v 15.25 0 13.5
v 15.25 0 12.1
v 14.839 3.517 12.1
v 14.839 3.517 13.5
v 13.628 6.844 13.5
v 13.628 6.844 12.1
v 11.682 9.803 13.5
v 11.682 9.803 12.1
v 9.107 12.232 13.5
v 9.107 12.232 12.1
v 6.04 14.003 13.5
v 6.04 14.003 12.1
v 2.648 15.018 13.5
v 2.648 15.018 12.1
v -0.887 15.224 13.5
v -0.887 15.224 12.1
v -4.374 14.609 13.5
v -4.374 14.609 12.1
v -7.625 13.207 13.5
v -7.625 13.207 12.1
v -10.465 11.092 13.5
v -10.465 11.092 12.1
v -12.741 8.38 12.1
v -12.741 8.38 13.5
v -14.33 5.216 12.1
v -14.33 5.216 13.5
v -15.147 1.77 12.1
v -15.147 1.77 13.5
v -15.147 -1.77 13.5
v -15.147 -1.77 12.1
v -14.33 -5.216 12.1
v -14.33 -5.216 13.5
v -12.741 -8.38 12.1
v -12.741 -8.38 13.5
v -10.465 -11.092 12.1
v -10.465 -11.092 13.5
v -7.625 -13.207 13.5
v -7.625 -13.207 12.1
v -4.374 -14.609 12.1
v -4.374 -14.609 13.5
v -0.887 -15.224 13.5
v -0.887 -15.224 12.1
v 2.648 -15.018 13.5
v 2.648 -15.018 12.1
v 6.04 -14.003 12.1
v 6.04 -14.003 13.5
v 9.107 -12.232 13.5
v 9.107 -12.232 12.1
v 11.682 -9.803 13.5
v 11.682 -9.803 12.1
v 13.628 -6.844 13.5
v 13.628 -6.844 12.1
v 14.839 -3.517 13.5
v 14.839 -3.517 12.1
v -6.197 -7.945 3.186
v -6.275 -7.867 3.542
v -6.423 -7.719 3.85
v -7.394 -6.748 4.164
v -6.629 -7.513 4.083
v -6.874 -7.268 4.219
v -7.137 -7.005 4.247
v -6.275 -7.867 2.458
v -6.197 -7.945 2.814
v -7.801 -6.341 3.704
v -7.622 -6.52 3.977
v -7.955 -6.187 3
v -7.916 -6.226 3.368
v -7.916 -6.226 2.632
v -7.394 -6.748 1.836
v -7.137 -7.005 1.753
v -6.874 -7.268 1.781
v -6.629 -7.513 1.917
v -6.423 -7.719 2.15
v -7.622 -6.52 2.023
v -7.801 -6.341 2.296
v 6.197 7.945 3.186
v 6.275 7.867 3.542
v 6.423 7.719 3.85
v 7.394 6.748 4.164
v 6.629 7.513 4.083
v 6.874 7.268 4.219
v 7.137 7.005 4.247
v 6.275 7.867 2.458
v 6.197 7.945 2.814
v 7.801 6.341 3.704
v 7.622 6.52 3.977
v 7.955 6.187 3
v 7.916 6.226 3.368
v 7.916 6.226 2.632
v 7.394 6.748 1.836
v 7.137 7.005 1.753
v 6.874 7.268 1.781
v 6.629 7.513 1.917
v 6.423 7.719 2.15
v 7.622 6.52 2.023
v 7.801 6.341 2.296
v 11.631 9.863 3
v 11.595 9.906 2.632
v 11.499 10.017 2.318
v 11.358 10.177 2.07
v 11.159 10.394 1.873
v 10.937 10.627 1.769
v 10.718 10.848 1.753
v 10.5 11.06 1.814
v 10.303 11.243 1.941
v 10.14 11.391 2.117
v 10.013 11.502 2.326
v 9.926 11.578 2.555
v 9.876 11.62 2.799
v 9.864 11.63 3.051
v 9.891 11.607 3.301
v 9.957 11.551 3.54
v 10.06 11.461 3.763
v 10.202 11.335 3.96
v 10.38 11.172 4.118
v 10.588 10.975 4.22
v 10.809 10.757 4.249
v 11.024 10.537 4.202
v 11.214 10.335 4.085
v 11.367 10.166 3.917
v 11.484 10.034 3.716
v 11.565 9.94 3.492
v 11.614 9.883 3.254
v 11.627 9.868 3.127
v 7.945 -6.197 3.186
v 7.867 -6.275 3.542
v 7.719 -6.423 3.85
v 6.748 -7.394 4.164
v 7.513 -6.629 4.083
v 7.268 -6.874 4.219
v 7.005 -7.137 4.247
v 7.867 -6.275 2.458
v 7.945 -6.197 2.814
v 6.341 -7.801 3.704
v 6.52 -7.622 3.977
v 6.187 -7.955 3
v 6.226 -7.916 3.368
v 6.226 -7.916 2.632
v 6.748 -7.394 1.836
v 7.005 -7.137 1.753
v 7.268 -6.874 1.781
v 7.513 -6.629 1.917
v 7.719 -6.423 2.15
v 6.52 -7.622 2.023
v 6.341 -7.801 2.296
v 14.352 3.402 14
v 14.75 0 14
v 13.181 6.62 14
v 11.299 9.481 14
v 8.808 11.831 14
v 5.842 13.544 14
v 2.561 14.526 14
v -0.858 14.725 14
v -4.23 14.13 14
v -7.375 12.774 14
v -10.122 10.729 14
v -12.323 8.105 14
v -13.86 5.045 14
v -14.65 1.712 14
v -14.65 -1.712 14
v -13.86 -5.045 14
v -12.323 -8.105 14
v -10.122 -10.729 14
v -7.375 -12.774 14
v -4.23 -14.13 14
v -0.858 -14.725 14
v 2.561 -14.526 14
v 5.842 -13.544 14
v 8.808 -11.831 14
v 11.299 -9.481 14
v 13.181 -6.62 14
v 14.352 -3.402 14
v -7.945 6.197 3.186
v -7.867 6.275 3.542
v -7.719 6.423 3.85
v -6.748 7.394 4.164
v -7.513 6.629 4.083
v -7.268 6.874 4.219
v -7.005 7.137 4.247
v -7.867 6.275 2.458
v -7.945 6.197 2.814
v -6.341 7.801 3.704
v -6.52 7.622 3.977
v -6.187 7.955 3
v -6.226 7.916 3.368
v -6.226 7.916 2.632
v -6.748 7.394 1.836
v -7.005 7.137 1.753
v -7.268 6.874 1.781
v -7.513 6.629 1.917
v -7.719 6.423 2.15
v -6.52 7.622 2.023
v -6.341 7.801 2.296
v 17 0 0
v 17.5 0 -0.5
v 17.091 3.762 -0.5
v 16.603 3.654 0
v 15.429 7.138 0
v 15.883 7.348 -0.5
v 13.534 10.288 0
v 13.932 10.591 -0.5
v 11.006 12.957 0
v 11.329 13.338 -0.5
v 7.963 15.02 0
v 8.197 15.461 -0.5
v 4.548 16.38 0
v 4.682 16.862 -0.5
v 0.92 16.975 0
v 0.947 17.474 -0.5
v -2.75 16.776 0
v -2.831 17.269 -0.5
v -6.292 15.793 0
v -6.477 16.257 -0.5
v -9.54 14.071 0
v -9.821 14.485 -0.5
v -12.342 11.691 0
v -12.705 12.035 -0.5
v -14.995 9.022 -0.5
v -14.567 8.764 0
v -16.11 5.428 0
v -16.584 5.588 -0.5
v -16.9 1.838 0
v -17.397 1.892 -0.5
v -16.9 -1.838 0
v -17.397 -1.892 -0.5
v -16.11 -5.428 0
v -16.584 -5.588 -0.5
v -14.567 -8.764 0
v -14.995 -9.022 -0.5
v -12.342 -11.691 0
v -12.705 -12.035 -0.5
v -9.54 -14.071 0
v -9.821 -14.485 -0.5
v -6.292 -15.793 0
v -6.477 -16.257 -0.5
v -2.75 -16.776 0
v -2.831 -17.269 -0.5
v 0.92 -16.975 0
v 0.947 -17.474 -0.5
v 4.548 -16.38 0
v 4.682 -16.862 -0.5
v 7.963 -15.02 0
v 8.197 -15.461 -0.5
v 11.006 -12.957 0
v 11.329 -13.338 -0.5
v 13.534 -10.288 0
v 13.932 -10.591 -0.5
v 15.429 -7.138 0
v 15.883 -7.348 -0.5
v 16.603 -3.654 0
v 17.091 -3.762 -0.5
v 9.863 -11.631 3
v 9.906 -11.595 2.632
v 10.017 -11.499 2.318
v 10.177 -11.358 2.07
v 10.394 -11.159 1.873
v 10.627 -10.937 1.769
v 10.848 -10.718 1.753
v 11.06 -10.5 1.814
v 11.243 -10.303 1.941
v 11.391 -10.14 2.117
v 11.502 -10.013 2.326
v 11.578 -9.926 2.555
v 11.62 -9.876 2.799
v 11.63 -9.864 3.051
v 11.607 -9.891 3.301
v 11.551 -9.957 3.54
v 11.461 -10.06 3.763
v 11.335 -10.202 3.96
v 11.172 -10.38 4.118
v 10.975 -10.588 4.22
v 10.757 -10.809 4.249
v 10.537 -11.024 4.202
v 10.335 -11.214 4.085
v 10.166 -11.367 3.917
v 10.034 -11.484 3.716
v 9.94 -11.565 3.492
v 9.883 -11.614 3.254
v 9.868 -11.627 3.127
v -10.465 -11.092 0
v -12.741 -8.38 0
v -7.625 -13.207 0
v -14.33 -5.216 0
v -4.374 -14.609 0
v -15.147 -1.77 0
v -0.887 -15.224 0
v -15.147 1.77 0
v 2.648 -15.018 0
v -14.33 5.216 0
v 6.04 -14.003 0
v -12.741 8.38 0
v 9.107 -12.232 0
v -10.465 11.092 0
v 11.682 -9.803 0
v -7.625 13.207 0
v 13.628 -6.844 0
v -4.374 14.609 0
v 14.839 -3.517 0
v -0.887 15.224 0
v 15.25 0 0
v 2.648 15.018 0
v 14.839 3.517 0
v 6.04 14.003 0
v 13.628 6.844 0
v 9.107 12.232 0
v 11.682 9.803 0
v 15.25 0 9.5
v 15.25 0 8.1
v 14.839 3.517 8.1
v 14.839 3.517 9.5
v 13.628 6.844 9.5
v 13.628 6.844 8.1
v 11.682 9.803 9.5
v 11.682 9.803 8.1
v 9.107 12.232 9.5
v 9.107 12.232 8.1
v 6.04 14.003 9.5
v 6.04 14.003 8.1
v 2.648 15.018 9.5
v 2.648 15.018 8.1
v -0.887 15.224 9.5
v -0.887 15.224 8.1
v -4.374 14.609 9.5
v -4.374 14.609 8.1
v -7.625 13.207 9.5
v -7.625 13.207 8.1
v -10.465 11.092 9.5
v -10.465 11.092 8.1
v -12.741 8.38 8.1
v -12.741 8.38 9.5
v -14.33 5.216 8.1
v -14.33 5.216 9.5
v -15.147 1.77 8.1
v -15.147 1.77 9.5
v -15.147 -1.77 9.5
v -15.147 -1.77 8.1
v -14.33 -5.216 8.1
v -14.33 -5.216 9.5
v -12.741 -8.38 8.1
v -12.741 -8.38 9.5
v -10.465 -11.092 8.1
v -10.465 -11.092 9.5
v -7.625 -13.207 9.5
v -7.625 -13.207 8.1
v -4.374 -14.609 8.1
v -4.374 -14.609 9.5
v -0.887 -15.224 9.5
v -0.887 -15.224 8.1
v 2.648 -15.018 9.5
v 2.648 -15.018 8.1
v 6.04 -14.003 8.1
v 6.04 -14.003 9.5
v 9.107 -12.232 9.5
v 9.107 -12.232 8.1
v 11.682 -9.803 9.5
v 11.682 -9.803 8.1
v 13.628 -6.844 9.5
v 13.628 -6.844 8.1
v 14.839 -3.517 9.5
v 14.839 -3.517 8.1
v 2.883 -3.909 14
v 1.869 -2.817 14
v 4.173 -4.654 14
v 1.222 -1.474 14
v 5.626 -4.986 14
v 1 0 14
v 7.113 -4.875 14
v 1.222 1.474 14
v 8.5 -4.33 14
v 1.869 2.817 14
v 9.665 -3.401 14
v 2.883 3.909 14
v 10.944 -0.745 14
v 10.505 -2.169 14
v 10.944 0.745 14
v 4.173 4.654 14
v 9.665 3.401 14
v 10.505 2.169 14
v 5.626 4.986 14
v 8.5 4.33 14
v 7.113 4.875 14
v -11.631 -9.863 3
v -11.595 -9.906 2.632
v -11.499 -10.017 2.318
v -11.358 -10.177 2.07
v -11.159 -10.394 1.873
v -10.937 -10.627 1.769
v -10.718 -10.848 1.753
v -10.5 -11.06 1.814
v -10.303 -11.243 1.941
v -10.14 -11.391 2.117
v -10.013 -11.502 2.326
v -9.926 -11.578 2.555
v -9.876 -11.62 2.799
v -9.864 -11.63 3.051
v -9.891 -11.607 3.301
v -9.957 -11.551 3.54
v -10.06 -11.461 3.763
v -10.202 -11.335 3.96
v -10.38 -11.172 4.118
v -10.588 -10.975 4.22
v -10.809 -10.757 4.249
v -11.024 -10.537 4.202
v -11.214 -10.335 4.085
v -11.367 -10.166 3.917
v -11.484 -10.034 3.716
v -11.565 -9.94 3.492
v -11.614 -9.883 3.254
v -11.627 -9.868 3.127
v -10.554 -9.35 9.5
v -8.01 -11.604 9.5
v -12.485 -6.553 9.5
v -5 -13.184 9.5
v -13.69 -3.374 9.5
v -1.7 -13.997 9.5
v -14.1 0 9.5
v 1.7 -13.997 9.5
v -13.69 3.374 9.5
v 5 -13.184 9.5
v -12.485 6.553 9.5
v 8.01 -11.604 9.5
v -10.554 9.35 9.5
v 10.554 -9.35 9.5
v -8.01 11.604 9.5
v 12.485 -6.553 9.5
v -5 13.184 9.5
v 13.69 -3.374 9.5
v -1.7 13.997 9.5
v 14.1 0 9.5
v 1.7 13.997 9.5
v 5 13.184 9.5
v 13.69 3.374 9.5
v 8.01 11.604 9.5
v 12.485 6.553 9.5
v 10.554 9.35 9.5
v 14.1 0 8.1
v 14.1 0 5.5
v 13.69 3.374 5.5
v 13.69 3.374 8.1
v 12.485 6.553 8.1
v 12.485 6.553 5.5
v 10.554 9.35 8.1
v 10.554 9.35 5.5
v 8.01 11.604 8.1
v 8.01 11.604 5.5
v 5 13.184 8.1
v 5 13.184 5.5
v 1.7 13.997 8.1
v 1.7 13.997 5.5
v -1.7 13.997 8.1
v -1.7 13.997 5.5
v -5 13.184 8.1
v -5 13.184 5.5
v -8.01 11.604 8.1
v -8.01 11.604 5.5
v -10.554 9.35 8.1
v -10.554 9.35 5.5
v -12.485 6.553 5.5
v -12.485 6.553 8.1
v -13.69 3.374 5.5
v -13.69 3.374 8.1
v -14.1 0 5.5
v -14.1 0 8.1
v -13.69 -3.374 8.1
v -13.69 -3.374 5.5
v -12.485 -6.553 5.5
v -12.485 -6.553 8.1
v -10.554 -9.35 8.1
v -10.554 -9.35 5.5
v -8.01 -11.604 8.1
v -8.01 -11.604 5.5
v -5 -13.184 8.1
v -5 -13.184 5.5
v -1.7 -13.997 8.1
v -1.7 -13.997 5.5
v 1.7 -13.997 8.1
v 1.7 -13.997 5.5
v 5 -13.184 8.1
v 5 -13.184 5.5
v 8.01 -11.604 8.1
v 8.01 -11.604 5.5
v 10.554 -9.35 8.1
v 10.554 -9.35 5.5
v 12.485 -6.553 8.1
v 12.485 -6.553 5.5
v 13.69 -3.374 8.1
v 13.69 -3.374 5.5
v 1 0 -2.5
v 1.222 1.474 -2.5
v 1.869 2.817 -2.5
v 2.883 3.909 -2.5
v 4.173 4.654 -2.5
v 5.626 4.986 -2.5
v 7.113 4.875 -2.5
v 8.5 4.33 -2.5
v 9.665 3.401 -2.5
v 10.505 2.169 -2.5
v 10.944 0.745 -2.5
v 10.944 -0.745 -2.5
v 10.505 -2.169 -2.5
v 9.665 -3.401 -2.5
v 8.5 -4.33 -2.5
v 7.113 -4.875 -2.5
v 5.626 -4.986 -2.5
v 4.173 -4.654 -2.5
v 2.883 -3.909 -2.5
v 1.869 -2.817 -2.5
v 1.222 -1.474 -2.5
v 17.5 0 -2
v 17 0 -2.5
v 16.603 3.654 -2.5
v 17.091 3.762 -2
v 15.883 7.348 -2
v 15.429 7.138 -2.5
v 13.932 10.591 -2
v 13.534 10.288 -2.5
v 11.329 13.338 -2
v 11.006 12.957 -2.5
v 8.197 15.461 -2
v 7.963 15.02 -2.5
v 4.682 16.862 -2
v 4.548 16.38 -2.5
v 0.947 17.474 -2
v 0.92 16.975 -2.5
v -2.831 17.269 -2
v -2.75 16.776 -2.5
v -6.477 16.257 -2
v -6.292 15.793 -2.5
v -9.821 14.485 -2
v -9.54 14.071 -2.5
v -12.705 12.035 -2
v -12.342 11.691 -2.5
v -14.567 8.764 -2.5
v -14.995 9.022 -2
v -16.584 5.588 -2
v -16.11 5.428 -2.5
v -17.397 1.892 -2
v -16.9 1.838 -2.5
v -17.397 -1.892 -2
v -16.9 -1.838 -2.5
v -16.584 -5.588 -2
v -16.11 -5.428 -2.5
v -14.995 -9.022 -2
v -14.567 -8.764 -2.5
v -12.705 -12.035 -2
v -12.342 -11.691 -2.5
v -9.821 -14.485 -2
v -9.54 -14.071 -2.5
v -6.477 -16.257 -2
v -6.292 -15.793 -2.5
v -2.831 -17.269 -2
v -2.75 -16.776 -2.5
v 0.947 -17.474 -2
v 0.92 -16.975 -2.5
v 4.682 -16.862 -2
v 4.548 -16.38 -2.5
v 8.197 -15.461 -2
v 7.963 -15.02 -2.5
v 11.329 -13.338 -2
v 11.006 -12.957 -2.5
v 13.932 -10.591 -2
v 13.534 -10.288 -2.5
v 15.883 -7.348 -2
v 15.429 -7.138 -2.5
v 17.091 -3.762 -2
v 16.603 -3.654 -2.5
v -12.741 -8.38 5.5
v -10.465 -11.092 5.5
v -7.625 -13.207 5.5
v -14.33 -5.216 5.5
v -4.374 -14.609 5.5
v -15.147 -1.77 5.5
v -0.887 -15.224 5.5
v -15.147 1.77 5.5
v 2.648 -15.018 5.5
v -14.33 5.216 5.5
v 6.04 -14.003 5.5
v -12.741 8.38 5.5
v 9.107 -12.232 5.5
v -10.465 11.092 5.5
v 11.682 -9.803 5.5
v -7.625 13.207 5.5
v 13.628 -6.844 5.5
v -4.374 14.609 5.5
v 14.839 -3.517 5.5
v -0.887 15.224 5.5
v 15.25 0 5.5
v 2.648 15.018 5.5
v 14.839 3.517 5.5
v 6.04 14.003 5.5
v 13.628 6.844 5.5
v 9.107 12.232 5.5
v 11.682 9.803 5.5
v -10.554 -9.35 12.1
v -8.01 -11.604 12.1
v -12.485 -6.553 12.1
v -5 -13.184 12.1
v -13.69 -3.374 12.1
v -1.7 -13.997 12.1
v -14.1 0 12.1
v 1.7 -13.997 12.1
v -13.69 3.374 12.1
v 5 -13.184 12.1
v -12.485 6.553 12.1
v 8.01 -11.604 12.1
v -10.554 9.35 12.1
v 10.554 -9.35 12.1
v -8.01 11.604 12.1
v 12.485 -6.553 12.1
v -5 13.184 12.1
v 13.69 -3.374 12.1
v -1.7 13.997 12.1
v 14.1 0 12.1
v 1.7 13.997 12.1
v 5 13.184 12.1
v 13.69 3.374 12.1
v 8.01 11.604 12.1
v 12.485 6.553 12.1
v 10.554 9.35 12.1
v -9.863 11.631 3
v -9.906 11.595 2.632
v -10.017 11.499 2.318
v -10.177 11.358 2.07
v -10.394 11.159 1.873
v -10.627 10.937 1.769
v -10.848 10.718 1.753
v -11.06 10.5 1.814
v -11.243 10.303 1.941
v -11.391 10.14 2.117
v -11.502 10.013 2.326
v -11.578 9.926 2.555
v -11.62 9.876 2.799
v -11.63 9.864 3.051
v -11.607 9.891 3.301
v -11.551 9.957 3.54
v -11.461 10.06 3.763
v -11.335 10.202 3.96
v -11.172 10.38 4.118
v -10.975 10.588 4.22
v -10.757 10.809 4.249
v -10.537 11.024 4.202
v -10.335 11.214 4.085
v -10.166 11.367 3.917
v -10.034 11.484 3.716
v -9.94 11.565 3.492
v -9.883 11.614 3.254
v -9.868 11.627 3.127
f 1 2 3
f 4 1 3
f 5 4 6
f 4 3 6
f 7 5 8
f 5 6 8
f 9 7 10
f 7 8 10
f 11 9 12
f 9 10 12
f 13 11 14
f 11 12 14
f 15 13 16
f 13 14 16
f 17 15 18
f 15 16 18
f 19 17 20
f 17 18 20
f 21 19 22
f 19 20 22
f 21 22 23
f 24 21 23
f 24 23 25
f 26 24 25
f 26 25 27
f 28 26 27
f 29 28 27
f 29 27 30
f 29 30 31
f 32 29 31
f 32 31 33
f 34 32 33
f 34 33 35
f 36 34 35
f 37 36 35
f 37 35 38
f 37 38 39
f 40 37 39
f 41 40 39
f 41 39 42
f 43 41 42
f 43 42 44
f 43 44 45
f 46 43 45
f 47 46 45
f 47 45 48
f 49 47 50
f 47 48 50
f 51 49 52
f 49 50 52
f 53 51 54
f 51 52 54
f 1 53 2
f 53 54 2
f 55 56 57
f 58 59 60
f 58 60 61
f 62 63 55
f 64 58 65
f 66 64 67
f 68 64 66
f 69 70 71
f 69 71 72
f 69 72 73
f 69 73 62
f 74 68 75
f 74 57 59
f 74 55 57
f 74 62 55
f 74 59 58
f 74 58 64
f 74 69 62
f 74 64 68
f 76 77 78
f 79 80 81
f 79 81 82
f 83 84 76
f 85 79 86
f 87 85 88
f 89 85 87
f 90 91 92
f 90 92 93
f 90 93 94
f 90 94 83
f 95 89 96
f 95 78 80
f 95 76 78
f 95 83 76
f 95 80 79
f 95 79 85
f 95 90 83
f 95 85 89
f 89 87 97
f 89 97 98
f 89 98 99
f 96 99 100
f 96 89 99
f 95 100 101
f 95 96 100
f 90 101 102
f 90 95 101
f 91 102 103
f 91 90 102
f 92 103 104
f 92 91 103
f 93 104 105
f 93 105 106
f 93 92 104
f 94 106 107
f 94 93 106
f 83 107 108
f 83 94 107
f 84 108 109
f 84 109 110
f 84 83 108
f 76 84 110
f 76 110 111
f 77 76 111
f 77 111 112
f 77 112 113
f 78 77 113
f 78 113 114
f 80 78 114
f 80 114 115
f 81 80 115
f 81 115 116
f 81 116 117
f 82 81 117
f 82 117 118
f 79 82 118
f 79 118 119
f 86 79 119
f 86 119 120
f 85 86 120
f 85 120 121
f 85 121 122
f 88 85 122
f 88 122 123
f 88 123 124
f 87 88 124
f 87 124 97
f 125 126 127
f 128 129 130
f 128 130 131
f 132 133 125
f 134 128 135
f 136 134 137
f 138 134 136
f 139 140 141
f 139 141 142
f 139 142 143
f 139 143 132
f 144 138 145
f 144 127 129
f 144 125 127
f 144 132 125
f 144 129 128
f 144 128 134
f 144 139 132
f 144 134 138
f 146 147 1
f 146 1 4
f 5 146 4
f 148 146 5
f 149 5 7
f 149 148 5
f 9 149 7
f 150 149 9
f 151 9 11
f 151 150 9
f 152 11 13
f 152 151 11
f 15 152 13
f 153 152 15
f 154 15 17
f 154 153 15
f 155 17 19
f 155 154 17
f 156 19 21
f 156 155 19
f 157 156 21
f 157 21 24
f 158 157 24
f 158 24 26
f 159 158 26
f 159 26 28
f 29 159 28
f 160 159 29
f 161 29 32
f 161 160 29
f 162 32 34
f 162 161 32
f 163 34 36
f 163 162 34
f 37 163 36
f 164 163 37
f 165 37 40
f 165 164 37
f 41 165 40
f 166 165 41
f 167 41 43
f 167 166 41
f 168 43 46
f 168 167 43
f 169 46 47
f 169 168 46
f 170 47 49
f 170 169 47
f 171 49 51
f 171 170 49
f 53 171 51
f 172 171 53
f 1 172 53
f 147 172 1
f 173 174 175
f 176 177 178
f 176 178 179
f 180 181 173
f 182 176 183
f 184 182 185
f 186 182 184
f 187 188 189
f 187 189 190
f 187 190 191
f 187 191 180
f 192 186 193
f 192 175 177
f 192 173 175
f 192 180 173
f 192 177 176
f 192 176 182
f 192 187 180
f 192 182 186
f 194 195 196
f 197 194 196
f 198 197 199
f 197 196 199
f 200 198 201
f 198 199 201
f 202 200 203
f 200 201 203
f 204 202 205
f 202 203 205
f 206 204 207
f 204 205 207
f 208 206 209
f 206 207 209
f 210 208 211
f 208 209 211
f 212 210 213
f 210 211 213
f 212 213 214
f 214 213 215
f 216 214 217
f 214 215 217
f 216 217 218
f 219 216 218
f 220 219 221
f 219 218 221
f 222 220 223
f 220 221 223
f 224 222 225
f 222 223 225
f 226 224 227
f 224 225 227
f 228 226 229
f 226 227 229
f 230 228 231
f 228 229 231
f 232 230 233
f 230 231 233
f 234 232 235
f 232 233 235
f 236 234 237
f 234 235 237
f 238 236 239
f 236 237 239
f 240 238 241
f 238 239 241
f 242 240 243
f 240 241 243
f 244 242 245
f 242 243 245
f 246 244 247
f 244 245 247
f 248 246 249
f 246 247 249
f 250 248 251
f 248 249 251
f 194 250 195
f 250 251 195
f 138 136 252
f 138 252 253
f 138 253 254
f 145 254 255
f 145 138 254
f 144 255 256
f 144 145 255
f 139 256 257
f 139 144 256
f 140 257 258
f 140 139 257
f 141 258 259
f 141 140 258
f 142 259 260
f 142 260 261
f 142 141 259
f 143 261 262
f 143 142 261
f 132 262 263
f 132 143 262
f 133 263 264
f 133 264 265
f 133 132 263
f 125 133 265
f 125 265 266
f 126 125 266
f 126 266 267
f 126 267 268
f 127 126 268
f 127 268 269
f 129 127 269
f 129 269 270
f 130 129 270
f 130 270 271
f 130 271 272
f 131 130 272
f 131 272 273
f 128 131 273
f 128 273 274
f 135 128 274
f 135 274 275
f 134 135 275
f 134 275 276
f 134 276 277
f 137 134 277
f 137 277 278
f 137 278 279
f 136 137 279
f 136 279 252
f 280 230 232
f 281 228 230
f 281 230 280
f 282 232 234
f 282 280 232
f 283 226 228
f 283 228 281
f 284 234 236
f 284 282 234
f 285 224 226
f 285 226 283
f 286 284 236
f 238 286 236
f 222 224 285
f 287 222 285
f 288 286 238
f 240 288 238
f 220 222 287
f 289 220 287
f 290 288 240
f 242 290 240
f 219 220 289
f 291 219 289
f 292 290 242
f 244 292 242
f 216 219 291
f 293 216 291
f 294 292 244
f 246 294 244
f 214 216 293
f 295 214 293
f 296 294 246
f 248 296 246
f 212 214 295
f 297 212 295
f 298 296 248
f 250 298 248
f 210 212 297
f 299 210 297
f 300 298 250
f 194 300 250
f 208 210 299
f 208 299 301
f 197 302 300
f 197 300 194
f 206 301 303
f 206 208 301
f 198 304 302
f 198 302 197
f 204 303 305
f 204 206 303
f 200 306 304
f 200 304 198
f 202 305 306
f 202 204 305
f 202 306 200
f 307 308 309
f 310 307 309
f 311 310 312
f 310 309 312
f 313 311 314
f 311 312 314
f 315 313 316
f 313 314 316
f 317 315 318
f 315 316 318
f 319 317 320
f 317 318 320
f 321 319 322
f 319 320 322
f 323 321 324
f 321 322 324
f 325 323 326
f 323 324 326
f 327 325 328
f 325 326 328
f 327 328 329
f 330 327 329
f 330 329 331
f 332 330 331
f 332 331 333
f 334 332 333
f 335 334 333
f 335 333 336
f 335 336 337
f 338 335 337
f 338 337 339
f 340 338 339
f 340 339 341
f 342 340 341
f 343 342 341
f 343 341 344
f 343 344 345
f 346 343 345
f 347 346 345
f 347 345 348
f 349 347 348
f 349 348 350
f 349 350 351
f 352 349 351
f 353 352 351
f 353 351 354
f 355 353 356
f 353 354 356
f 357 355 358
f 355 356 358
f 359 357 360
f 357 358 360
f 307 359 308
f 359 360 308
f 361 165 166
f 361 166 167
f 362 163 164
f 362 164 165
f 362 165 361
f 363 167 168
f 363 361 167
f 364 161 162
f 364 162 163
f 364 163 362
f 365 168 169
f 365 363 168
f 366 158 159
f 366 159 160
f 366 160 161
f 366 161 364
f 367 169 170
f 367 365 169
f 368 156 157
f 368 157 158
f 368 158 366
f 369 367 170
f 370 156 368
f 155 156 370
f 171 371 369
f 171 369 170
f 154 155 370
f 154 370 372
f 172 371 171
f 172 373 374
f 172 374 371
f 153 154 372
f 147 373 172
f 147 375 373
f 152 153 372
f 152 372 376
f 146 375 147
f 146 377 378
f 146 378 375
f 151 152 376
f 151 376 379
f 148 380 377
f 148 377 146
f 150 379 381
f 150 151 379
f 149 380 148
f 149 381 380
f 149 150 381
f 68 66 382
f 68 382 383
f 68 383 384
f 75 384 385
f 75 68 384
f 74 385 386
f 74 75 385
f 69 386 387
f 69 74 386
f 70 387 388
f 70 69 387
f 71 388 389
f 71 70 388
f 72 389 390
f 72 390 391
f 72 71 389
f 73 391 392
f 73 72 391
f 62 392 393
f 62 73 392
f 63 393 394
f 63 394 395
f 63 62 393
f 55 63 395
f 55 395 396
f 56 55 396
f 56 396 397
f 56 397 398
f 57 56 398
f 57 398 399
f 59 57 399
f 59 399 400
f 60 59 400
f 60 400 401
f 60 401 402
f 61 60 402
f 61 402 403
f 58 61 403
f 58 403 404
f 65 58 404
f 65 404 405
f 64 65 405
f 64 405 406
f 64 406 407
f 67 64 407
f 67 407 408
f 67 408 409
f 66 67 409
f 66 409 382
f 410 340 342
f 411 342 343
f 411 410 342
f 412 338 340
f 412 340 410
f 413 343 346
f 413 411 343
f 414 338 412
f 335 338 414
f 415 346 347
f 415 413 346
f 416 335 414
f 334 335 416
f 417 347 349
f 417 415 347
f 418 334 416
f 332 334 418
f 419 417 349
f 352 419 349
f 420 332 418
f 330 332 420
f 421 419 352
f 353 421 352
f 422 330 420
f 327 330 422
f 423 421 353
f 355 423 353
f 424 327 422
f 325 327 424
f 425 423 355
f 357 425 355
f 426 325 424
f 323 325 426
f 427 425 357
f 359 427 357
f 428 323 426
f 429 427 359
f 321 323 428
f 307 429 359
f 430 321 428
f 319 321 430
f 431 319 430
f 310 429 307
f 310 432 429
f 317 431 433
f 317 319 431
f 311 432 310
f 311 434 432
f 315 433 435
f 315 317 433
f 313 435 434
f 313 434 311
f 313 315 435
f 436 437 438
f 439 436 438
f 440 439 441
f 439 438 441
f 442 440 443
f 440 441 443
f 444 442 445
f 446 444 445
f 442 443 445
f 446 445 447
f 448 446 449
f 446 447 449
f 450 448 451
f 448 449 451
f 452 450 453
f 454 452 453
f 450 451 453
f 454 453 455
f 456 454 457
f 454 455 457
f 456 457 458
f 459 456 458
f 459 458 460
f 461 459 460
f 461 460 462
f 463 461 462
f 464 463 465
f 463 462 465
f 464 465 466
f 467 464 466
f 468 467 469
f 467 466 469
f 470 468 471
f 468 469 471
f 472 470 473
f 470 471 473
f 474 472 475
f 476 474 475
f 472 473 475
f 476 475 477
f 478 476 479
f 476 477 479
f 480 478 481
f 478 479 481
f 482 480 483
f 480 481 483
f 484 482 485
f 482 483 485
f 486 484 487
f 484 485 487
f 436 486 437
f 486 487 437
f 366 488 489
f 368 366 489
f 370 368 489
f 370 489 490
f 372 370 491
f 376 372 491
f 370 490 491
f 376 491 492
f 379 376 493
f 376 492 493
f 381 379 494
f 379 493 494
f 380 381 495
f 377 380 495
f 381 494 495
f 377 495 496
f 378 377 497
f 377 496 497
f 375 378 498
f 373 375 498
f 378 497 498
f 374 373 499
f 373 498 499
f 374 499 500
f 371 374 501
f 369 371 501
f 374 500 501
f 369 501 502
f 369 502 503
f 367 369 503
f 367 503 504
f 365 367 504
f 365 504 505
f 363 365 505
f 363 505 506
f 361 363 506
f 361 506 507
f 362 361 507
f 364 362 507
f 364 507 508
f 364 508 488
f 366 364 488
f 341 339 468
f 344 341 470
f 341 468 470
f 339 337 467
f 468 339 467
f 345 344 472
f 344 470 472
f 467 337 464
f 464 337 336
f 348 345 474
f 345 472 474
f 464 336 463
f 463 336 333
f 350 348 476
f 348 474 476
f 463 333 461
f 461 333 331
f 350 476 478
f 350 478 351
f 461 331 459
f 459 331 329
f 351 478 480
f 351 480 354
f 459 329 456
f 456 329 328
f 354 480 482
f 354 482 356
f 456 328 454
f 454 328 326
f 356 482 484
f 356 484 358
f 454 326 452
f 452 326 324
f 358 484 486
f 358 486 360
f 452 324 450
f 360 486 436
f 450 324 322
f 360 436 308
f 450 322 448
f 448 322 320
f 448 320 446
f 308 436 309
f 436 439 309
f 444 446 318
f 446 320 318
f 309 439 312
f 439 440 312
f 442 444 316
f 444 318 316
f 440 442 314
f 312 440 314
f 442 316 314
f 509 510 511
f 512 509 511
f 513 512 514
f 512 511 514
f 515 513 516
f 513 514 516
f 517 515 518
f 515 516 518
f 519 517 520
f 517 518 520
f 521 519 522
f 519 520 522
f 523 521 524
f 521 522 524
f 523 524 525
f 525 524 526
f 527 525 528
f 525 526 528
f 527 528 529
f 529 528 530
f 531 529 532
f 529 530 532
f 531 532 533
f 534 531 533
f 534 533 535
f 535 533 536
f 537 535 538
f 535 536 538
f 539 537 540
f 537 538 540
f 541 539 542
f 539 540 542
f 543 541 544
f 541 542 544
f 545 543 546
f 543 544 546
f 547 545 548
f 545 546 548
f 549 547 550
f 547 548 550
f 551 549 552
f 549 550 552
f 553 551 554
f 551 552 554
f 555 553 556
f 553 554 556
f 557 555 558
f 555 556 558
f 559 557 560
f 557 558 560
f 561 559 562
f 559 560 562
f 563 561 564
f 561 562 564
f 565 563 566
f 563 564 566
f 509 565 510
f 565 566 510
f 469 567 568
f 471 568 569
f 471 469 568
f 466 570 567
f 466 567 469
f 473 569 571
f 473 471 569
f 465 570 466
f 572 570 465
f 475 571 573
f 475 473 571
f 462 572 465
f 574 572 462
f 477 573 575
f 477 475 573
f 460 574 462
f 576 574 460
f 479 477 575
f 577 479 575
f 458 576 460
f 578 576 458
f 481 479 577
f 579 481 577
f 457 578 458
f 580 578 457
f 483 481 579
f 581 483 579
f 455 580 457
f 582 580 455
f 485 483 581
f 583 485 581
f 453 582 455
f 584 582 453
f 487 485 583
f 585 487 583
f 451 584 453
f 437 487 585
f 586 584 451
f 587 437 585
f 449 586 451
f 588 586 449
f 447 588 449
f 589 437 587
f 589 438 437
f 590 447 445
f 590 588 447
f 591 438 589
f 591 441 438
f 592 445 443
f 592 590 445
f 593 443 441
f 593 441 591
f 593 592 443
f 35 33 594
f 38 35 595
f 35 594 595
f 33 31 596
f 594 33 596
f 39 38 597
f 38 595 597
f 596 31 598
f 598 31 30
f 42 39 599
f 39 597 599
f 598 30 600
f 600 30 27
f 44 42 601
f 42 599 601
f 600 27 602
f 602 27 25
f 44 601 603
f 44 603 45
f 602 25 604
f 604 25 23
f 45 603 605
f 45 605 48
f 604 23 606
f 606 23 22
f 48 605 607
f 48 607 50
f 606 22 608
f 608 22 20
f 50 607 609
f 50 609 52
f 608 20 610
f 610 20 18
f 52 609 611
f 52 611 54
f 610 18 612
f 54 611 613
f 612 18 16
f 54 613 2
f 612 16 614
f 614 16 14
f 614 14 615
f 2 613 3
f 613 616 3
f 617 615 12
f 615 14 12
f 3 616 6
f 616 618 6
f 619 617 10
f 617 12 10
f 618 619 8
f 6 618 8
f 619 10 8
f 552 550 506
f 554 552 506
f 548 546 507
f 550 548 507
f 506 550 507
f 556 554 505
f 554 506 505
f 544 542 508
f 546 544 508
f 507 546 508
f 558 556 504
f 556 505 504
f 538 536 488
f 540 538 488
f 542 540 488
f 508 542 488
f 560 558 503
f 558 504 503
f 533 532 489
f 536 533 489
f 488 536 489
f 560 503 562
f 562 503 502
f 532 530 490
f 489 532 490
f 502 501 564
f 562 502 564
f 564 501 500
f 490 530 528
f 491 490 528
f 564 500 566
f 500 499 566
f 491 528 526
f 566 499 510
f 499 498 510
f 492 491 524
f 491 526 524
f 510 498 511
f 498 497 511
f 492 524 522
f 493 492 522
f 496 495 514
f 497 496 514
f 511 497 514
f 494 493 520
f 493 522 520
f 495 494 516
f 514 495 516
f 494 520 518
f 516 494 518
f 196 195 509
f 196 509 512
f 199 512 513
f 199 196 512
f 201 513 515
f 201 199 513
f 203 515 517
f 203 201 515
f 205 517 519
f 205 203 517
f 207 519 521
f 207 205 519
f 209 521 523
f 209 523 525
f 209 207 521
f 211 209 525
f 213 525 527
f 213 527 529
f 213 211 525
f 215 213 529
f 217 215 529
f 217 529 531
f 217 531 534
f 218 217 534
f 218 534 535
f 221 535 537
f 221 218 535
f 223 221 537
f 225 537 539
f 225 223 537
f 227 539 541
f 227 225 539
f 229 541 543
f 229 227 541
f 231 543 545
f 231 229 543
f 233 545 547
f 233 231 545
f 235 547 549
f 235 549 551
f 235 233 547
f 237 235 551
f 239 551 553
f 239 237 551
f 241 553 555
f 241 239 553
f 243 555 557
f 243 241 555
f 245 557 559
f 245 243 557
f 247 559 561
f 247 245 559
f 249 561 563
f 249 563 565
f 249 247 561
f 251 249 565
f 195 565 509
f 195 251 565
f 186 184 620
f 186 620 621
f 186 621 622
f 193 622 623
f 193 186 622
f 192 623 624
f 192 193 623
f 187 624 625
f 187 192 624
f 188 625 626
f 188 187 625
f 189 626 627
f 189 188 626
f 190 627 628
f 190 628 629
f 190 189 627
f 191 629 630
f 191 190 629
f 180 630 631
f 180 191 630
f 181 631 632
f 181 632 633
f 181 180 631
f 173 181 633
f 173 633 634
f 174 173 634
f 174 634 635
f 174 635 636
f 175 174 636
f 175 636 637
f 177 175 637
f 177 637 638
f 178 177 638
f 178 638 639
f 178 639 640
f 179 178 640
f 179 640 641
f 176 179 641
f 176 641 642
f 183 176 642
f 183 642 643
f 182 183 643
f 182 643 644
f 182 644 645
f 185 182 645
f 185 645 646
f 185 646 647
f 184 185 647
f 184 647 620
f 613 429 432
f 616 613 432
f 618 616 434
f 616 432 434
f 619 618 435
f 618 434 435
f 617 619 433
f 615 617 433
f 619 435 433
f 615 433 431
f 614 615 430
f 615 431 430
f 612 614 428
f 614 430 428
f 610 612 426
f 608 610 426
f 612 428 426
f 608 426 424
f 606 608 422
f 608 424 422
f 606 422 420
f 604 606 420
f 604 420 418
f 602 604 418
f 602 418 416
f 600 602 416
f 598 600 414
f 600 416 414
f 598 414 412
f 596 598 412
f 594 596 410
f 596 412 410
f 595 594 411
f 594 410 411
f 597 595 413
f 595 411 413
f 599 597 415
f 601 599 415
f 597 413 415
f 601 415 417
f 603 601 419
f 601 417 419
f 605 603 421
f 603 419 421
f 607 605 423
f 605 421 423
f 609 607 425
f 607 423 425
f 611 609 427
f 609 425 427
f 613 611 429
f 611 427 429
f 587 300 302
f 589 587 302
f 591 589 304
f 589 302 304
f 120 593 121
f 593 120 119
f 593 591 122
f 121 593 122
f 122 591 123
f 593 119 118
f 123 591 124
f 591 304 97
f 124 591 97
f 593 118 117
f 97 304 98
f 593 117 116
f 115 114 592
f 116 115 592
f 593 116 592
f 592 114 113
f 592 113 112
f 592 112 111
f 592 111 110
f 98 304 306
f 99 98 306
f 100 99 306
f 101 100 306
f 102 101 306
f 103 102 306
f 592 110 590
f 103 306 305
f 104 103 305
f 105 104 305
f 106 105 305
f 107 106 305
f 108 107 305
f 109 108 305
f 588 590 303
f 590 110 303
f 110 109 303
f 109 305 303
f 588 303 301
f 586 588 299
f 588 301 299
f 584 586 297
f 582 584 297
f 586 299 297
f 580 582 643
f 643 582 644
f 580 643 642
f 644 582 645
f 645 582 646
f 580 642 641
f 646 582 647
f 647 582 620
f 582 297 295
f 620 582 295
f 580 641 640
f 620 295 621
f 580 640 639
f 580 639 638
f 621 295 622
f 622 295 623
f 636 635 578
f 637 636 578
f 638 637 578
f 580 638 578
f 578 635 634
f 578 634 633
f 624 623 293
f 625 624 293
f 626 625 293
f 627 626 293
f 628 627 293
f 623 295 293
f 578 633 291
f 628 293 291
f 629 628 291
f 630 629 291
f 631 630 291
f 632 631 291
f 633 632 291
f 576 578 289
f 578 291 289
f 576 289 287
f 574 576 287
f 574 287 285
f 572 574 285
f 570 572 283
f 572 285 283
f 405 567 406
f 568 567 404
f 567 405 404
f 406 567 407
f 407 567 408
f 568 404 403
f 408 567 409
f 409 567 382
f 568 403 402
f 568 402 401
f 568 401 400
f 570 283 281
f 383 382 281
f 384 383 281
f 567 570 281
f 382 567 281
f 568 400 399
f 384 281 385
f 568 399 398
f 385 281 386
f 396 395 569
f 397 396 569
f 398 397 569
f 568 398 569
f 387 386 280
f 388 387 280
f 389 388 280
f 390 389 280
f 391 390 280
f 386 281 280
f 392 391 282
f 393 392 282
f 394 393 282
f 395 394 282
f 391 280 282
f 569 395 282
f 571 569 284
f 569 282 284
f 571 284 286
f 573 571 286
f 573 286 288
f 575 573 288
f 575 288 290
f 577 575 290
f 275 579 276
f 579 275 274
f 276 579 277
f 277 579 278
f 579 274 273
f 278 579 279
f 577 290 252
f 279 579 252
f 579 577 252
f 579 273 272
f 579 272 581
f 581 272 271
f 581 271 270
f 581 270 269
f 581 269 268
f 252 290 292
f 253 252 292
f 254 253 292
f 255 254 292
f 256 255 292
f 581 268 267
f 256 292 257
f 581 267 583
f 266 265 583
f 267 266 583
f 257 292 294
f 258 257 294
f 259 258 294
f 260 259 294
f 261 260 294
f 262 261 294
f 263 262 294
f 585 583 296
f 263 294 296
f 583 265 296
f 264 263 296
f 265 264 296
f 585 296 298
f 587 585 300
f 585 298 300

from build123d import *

# Parameters (mm, degrees)
SKETCH_1_R               = 17.5
EXTRUDE_1_DEPTH          = 2.5
SKETCH_1_3_R             = 15.25
EXTRUDE_2_DEPTH          = 14
CUT_EXTRUDE_START        = 5.5
SKETCH_1_4_R             = 15.25
SKETCH_1_4_R_2           = 14.1
CUT_EXTRUDE_1_DEPTH      = 2.6
CUT_EXTRUDE_START_2      = 9.5
SKETCH_1_5_R             = 15.25
SKETCH_1_5_R_2           = 14.1
CUT_EXTRUDE_2_DEPTH      = 2.6
CHAMFER_1_SIZE           = 0.5
SKETCH_2_R               = 5
CUT_EXTRUDE_5_DEPTH      = 30.744747435
CUT_EXTRUDE_START_3      = 10
SKETCH_4_R               = 1.25
CUT_EXTRUDE_6_DEPTH      = 19.434134416
PATTERN_CIRCULAR_1_COUNT = 4


with BuildPart() as part:
    # Эскиз1 → Бобышка-Вытянуть1 (new body)
    with BuildSketch(Plane.XY):
        Circle(SKETCH_1_R)
    extrude(amount=-EXTRUDE_1_DEPTH)

    # Эскиз1<3> → Бобышка-Вытянуть2 (add)
    with BuildSketch(Plane.XY):
        Circle(SKETCH_1_3_R)
    extrude(amount=EXTRUDE_2_DEPTH)

    # Эскиз1<4> → Вырез-Вытянуть1 (cut)
    with BuildSketch(Plane.XY.offset(CUT_EXTRUDE_START)):
        Circle(SKETCH_1_4_R)
        Circle(SKETCH_1_4_R_2, mode=Mode.SUBTRACT)
    extrude(amount=CUT_EXTRUDE_1_DEPTH, mode=Mode.SUBTRACT)

    # Эскиз1<5> → Вырез-Вытянуть2 (cut)
    with BuildSketch(Plane.XY.offset(CUT_EXTRUDE_START_2)):
        Circle(SKETCH_1_5_R)
        Circle(SKETCH_1_5_R_2, mode=Mode.SUBTRACT)
    extrude(amount=CUT_EXTRUDE_2_DEPTH, mode=Mode.SUBTRACT)

    # Фаска1
    chamfer_1_edges = [part.edges().sort_by_distance(p)[0] for p in [
        (-15.25, 0, 14),
        (-17.5, 0, 0),
        (-17.5, 0, -2.5),
    ]]
    chamfer(chamfer_1_edges, length=CHAMFER_1_SIZE)

    # Эскиз2 → Вырез-Вытянуть5 (cut, through all)
    with BuildSketch(Plane(origin=(0, 0, -2.5), x_dir=(-1, 0, 0), z_dir=(0, 0, -1))):
        with Locations((-6, 0)):
            Circle(SKETCH_2_R)
    extrude(amount=-CUT_EXTRUDE_5_DEPTH, mode=Mode.SUBTRACT)

    # Эскиз4 → Вырез-Вытянуть6 (cut, through all)
    with BuildSketch(Plane(origin=(0, 0, 0), x_dir=(0, 0, -1), z_dir=(0.7071067811865488, 0.7071067811865464, 0)).offset(CUT_EXTRUDE_START_3)):
        with Locations((-3, 0)):
            Circle(SKETCH_4_R)
    cut_extrude_6 = extrude(amount=CUT_EXTRUDE_6_DEPTH, mode=Mode.SUBTRACT)

    # Круговой массив1: Вырез-Вытянуть6 ×4 about axis
    pattern_circular_1_axis = Axis((0, 0, 0), (0, 0, -1))
    for i in range(1, PATTERN_CIRCULAR_1_COUNT):
        add(cut_extrude_6.rotate(pattern_circular_1_axis, i * 360 / PATTERN_CIRCULAR_1_COUNT), mode=Mode.SUBTRACT)


solid = part.part
